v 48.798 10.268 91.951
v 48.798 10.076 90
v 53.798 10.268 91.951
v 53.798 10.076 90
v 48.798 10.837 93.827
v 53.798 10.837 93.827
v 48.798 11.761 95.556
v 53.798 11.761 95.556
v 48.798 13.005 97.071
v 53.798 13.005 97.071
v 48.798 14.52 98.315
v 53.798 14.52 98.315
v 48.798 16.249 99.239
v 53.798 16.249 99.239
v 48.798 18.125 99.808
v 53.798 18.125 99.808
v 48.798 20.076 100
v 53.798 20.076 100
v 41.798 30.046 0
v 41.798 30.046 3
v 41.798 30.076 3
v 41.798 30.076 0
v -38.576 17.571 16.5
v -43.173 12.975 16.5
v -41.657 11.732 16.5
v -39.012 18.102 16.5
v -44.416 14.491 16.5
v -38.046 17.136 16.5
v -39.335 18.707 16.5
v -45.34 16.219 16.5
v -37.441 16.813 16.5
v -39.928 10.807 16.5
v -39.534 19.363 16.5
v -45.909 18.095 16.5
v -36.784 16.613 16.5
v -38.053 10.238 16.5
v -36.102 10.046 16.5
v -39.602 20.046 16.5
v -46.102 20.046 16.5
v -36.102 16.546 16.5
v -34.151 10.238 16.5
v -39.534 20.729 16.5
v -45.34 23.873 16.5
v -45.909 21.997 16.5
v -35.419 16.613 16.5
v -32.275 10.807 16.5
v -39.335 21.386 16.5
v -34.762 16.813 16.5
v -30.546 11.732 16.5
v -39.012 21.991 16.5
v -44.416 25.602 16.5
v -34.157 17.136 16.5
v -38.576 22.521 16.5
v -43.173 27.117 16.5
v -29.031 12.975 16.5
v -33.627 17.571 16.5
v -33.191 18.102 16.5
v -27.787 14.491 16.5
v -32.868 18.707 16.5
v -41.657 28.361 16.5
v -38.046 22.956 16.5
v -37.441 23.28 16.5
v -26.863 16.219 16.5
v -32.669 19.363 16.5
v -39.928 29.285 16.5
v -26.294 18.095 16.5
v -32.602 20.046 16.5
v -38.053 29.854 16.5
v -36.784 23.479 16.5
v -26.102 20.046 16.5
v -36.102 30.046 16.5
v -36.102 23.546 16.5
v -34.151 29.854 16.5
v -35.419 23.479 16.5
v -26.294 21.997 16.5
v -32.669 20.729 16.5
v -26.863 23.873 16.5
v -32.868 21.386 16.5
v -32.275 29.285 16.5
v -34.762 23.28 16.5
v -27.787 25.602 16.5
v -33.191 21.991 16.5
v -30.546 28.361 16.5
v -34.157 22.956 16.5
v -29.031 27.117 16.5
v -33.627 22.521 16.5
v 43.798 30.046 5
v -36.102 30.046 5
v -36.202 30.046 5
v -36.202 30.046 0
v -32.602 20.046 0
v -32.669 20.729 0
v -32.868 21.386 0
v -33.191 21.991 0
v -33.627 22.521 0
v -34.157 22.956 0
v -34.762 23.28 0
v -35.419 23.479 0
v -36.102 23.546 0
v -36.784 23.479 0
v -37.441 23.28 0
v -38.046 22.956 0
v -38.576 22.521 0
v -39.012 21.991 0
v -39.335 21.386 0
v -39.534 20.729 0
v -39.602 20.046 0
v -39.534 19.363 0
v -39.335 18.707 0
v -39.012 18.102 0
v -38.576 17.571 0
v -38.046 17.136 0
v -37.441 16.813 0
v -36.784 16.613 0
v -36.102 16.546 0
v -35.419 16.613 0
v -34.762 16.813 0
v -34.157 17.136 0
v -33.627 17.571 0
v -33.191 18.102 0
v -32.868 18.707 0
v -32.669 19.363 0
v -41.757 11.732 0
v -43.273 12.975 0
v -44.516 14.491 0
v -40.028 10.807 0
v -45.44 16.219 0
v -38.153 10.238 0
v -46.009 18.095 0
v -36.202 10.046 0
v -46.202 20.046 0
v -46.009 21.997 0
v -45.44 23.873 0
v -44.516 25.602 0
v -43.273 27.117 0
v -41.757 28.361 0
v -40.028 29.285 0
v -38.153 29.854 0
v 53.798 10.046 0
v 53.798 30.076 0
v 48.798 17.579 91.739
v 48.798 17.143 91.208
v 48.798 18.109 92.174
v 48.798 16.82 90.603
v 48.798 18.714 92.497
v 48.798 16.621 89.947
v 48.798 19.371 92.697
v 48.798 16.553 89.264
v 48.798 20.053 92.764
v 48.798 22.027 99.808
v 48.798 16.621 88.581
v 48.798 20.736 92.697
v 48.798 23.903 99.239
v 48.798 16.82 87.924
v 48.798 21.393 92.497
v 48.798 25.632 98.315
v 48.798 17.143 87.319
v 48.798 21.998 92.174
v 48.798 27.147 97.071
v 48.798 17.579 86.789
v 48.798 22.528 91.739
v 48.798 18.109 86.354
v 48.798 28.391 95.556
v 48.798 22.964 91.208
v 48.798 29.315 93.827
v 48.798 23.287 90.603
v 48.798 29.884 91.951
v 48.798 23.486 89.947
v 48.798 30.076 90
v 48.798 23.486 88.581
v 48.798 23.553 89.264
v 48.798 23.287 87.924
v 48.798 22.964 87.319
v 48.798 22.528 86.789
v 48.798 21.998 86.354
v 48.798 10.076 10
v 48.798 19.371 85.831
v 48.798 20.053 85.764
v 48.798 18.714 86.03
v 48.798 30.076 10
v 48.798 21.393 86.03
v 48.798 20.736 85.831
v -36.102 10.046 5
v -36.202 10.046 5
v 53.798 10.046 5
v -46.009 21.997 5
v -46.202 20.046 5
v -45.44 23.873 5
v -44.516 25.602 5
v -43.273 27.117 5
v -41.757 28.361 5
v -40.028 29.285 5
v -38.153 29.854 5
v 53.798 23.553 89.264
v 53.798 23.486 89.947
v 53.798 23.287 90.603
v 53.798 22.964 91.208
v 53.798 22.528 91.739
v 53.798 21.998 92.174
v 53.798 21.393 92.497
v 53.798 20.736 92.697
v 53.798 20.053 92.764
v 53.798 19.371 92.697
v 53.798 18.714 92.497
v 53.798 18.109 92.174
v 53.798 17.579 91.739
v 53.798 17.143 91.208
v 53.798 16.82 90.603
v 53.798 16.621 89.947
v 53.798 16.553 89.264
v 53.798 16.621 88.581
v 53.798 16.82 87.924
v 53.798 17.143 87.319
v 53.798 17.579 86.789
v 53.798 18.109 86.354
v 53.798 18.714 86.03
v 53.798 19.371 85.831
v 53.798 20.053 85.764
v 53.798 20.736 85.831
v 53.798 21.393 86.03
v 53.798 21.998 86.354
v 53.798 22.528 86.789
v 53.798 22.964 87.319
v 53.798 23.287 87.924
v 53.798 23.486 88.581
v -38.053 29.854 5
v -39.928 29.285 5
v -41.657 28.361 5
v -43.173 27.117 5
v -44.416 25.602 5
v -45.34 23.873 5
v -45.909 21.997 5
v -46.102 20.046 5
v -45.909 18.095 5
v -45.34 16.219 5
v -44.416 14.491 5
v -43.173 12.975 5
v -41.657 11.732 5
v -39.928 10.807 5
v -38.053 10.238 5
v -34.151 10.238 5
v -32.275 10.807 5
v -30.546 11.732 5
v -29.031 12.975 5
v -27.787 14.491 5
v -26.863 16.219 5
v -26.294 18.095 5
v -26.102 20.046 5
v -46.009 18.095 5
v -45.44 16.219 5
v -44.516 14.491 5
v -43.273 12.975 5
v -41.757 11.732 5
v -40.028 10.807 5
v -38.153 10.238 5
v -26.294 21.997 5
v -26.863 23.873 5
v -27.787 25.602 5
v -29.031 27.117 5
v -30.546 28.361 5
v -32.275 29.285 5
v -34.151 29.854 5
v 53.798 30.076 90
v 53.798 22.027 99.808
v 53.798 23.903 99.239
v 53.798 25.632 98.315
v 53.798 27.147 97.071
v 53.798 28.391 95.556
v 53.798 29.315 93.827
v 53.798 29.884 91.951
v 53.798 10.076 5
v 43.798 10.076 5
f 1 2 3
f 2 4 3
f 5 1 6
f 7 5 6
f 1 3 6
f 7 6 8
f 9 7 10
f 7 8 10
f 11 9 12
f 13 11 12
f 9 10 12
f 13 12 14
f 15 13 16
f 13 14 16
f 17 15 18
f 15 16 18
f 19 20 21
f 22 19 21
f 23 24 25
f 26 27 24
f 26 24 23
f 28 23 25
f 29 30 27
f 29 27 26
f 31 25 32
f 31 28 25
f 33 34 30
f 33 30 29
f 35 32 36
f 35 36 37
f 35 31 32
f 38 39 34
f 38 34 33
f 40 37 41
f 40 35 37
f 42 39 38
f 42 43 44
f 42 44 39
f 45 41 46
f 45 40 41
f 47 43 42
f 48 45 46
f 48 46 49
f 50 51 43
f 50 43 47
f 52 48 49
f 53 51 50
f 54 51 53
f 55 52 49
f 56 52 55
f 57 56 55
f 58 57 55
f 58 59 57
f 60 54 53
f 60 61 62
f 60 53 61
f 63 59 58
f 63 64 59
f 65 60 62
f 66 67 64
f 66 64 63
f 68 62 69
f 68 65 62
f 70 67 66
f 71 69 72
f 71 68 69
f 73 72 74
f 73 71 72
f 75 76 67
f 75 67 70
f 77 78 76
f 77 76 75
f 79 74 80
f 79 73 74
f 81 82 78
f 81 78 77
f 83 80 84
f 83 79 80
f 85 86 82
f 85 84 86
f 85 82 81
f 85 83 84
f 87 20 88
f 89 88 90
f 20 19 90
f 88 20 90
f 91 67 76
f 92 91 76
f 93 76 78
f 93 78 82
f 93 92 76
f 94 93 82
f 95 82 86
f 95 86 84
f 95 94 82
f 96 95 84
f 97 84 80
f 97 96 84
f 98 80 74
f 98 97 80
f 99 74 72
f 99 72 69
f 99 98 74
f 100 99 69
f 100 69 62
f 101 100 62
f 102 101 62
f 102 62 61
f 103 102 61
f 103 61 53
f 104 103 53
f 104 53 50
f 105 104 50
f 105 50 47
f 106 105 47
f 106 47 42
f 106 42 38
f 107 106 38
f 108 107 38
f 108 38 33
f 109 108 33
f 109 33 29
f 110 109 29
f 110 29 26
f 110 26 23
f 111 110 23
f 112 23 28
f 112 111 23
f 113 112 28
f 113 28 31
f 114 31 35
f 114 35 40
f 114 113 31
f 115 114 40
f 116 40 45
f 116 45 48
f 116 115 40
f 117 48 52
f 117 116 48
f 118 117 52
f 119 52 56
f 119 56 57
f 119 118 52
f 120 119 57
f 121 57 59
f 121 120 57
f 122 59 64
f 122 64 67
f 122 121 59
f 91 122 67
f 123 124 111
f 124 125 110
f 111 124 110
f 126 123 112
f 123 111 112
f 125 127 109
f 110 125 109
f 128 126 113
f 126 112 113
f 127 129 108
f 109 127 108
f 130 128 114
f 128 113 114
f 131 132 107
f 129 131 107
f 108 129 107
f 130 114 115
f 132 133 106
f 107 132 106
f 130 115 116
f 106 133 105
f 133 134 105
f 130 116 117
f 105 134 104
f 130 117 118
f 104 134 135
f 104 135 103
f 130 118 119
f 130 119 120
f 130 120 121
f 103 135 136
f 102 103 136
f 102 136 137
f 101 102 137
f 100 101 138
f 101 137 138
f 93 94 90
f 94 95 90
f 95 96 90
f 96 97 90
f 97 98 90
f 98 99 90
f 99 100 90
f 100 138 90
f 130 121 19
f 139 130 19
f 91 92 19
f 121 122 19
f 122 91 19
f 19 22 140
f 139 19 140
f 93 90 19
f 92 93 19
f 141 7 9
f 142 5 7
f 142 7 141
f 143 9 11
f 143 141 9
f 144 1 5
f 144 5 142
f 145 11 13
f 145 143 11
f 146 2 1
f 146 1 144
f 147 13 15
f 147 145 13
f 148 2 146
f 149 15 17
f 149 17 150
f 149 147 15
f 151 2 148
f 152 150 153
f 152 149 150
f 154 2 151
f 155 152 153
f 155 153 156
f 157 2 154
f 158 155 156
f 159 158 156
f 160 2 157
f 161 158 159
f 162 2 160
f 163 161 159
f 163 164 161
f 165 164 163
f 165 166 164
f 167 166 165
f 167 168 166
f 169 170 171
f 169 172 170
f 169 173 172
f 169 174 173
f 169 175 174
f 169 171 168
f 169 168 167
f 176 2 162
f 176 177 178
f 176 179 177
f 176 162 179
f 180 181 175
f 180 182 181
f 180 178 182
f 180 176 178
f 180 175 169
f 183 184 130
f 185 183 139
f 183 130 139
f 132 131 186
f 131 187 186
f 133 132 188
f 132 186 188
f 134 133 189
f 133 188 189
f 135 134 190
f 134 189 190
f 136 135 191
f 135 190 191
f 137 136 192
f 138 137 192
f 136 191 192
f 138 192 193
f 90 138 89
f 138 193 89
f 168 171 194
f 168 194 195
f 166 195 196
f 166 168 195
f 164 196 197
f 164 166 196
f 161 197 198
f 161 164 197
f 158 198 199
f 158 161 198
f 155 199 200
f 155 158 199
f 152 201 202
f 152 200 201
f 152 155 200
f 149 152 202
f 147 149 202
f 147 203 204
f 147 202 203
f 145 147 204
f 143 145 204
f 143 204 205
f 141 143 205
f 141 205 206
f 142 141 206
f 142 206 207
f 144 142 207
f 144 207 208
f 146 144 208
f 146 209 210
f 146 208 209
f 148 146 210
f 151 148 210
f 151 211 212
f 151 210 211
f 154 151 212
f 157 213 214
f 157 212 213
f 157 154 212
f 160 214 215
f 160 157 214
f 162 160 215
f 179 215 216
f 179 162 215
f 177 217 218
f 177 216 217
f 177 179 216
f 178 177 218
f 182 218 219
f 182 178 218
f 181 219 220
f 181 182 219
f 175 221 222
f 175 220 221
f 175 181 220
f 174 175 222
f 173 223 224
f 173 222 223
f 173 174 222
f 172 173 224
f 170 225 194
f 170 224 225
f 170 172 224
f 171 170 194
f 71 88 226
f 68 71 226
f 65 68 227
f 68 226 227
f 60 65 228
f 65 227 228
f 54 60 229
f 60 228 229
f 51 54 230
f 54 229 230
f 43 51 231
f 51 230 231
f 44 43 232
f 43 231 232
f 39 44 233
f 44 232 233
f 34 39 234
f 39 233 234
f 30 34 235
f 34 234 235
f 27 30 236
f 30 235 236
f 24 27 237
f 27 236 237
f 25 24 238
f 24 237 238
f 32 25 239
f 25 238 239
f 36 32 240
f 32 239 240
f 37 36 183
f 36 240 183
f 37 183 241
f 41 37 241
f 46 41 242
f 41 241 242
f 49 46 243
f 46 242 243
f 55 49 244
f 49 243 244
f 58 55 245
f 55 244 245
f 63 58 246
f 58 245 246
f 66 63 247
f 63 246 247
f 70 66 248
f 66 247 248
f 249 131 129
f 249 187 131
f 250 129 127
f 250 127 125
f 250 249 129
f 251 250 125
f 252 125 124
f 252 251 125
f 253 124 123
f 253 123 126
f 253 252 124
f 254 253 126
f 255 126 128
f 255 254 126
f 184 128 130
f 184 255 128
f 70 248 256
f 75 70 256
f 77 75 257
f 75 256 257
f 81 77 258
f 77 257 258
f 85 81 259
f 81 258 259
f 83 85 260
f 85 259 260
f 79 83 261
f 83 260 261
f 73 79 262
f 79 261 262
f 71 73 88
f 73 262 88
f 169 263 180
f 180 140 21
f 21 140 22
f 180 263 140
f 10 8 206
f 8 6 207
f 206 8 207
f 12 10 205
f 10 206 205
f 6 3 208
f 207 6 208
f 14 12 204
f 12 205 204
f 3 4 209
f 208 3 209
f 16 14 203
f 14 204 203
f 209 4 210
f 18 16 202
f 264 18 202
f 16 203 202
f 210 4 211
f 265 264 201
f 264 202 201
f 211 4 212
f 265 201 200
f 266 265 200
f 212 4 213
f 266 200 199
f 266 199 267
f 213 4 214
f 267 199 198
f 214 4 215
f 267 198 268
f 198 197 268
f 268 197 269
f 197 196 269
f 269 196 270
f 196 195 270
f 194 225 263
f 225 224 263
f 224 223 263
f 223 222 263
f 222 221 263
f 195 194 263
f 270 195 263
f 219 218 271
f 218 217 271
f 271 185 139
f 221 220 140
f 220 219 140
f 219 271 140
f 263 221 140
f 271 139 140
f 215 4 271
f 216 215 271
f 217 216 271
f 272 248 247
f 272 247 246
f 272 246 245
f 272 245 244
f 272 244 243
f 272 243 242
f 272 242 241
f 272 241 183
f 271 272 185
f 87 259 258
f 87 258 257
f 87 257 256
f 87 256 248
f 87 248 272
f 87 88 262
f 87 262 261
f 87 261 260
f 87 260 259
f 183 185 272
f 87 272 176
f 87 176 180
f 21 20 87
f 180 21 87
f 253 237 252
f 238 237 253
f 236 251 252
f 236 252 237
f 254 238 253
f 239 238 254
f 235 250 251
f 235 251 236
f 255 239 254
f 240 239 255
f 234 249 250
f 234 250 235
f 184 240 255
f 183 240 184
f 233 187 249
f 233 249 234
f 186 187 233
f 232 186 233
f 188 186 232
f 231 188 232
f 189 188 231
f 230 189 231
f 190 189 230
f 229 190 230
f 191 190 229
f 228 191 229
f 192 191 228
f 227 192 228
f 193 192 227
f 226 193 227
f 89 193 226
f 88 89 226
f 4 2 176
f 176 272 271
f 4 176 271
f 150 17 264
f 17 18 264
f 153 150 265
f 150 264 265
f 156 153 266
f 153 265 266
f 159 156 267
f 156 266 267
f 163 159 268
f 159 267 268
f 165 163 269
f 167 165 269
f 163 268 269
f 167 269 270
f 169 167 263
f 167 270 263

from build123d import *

# Parameters (mm, degrees)
F0_R     = 3.5
F1_DEPTH = 5
F2_R     = 9.99999
F4_START = 5
F3_W     = 5
F3_H     = 20
F4_DEPTH = 95
F5_R     = 3.5
F6_DEPTH = 79.3
F7_R     = 9.99999
F8_DEPTH = 16.5
F3_W_2   = 7
F9_DEPTH = 10
F10_SIZE = 6.99999


# Not quite as in the source:
# - a fillet or chamfer is up to 0.001 mm smaller than in the source, because OpenCascade refuses the exact size


with BuildPart() as f1:
    # F0 (on Top) → F1 (new body)
    with BuildSketch(Plane.XY):
        with BuildLine():
            Line((-36.1016022205, 30.0462352857), (-46.2016022205, 30.0462352857))
            Line((-46.2016022205, 30.0462352857), (-46.2016022205, 10.0462352857))
            Line((-46.2016022205, 10.0462352857), (-36.1016022205, 10.0462352857))
            ThreePointArc((-36.1016022205, 10.0462352857), (-46.1016022205, 20.0462352857), (-36.1016022205, 30.0462352857))
        make_face()
        with BuildLine():
            Line((53.7983977795, 30.0462352857), (-36.1016022205, 30.0462352857))
            ThreePointArc((-36.1016022205, 30.0462352857), (-29.0305344087, 27.1173030976), (-26.1016022205, 20.0462352857))
            ThreePointArc((-26.1016022205, 20.0462352857), (-29.0305344087, 12.9751674738), (-36.1016022205, 10.0462352857))
            Line((-36.1016022205, 10.0462352857), (53.7983977795, 10.0462352857))
            Line((53.7983977795, 10.0462352857), (53.7983977795, 30.0462352857))
        make_face()
        with BuildLine():
            ThreePointArc((-26.1016022205, 20.0462352857), (-29.0305344087, 27.1173030976), (-36.1016022205, 30.0462352857))
            ThreePointArc((-36.1016022205, 30.0462352857), (-46.1016022205, 20.0462352857), (-36.1016022205, 10.0462352857))
            ThreePointArc((-36.1016022205, 10.0462352857), (-29.0305344087, 12.9751674738), (-26.1016022205, 20.0462352857))
        make_face()
        with Locations((-36.1016022205, 20.0462352857)):
            Circle(F0_R, mode=Mode.SUBTRACT)
    extrude(amount=F1_DEPTH)

    # F2 (radius 10 in the source; OpenCascade refuses exactly that, so slightly less here)
    f2_edges = [f1.edges().sort_by_distance(p)[0] for p in [
        (-46.201602, 30.046235, 2.5),
        (-46.201602, 10.046235, 2.5),
    ]]
    fillet(f2_edges, radius=F2_R)

    # F3 (on Top) → F4 (join)
    with BuildSketch(Plane.XY.offset(F4_START)):
        with Locations((51.2983977795, 20.0760087371)):
            Rectangle(F3_W, F3_H)
    extrude(amount=F4_DEPTH)

    # F5 (on Right) → F6 (cut)
    with BuildSketch(Plane.YZ):
        with Locations((20.0534593314, 89.2638255358)):
            Circle(F5_R)
    extrude(amount=F6_DEPTH, mode=Mode.SUBTRACT)

    # F7 (radius 10 in the source; OpenCascade refuses exactly that, so slightly less here)
    f7_edges = [f1.edges().sort_by_distance(p)[0] for p in [
        (51.298398, 10.076009, 100),
        (51.298398, 30.076009, 100),
    ]]
    fillet(f7_edges, radius=F7_R)

    # F0 (on Top) → F8 (join)
    with BuildSketch(Plane.XY):
        with BuildLine():
            ThreePointArc((-26.1016022205, 20.0462352857), (-29.0305344087, 27.1173030976), (-36.1016022205, 30.0462352857))
            ThreePointArc((-36.1016022205, 30.0462352857), (-46.1016022205, 20.0462352857), (-36.1016022205, 10.0462352857))
            ThreePointArc((-36.1016022205, 10.0462352857), (-29.0305344087, 12.9751674738), (-26.1016022205, 20.0462352857))
        make_face()
        with Locations((-36.1016022205, 20.0462352857)):
            Circle(F0_R, mode=Mode.SUBTRACT)
    extrude(amount=F8_DEPTH)

    # F3 (on Top) → F9 (join)
    with BuildSketch(Plane.XY):
        with Locations((51.2983977795, 20.0760087371)):
            Rectangle(F3_W, F3_H)
        with Locations((45.2983977795, 20.0760087371)):
            Rectangle(F3_W_2, F3_H)
    extrude(amount=F9_DEPTH)

    # F10 (size 7 in the source; OpenCascade refuses exactly that, so slightly less here)
    f10_edges = [f1.edges().sort_by_distance(p)[0] for p in [
        (41.798398, 20.076009, 10),
    ]]
    chamfer(f10_edges, length=F10_SIZE)


solid = f1.part
